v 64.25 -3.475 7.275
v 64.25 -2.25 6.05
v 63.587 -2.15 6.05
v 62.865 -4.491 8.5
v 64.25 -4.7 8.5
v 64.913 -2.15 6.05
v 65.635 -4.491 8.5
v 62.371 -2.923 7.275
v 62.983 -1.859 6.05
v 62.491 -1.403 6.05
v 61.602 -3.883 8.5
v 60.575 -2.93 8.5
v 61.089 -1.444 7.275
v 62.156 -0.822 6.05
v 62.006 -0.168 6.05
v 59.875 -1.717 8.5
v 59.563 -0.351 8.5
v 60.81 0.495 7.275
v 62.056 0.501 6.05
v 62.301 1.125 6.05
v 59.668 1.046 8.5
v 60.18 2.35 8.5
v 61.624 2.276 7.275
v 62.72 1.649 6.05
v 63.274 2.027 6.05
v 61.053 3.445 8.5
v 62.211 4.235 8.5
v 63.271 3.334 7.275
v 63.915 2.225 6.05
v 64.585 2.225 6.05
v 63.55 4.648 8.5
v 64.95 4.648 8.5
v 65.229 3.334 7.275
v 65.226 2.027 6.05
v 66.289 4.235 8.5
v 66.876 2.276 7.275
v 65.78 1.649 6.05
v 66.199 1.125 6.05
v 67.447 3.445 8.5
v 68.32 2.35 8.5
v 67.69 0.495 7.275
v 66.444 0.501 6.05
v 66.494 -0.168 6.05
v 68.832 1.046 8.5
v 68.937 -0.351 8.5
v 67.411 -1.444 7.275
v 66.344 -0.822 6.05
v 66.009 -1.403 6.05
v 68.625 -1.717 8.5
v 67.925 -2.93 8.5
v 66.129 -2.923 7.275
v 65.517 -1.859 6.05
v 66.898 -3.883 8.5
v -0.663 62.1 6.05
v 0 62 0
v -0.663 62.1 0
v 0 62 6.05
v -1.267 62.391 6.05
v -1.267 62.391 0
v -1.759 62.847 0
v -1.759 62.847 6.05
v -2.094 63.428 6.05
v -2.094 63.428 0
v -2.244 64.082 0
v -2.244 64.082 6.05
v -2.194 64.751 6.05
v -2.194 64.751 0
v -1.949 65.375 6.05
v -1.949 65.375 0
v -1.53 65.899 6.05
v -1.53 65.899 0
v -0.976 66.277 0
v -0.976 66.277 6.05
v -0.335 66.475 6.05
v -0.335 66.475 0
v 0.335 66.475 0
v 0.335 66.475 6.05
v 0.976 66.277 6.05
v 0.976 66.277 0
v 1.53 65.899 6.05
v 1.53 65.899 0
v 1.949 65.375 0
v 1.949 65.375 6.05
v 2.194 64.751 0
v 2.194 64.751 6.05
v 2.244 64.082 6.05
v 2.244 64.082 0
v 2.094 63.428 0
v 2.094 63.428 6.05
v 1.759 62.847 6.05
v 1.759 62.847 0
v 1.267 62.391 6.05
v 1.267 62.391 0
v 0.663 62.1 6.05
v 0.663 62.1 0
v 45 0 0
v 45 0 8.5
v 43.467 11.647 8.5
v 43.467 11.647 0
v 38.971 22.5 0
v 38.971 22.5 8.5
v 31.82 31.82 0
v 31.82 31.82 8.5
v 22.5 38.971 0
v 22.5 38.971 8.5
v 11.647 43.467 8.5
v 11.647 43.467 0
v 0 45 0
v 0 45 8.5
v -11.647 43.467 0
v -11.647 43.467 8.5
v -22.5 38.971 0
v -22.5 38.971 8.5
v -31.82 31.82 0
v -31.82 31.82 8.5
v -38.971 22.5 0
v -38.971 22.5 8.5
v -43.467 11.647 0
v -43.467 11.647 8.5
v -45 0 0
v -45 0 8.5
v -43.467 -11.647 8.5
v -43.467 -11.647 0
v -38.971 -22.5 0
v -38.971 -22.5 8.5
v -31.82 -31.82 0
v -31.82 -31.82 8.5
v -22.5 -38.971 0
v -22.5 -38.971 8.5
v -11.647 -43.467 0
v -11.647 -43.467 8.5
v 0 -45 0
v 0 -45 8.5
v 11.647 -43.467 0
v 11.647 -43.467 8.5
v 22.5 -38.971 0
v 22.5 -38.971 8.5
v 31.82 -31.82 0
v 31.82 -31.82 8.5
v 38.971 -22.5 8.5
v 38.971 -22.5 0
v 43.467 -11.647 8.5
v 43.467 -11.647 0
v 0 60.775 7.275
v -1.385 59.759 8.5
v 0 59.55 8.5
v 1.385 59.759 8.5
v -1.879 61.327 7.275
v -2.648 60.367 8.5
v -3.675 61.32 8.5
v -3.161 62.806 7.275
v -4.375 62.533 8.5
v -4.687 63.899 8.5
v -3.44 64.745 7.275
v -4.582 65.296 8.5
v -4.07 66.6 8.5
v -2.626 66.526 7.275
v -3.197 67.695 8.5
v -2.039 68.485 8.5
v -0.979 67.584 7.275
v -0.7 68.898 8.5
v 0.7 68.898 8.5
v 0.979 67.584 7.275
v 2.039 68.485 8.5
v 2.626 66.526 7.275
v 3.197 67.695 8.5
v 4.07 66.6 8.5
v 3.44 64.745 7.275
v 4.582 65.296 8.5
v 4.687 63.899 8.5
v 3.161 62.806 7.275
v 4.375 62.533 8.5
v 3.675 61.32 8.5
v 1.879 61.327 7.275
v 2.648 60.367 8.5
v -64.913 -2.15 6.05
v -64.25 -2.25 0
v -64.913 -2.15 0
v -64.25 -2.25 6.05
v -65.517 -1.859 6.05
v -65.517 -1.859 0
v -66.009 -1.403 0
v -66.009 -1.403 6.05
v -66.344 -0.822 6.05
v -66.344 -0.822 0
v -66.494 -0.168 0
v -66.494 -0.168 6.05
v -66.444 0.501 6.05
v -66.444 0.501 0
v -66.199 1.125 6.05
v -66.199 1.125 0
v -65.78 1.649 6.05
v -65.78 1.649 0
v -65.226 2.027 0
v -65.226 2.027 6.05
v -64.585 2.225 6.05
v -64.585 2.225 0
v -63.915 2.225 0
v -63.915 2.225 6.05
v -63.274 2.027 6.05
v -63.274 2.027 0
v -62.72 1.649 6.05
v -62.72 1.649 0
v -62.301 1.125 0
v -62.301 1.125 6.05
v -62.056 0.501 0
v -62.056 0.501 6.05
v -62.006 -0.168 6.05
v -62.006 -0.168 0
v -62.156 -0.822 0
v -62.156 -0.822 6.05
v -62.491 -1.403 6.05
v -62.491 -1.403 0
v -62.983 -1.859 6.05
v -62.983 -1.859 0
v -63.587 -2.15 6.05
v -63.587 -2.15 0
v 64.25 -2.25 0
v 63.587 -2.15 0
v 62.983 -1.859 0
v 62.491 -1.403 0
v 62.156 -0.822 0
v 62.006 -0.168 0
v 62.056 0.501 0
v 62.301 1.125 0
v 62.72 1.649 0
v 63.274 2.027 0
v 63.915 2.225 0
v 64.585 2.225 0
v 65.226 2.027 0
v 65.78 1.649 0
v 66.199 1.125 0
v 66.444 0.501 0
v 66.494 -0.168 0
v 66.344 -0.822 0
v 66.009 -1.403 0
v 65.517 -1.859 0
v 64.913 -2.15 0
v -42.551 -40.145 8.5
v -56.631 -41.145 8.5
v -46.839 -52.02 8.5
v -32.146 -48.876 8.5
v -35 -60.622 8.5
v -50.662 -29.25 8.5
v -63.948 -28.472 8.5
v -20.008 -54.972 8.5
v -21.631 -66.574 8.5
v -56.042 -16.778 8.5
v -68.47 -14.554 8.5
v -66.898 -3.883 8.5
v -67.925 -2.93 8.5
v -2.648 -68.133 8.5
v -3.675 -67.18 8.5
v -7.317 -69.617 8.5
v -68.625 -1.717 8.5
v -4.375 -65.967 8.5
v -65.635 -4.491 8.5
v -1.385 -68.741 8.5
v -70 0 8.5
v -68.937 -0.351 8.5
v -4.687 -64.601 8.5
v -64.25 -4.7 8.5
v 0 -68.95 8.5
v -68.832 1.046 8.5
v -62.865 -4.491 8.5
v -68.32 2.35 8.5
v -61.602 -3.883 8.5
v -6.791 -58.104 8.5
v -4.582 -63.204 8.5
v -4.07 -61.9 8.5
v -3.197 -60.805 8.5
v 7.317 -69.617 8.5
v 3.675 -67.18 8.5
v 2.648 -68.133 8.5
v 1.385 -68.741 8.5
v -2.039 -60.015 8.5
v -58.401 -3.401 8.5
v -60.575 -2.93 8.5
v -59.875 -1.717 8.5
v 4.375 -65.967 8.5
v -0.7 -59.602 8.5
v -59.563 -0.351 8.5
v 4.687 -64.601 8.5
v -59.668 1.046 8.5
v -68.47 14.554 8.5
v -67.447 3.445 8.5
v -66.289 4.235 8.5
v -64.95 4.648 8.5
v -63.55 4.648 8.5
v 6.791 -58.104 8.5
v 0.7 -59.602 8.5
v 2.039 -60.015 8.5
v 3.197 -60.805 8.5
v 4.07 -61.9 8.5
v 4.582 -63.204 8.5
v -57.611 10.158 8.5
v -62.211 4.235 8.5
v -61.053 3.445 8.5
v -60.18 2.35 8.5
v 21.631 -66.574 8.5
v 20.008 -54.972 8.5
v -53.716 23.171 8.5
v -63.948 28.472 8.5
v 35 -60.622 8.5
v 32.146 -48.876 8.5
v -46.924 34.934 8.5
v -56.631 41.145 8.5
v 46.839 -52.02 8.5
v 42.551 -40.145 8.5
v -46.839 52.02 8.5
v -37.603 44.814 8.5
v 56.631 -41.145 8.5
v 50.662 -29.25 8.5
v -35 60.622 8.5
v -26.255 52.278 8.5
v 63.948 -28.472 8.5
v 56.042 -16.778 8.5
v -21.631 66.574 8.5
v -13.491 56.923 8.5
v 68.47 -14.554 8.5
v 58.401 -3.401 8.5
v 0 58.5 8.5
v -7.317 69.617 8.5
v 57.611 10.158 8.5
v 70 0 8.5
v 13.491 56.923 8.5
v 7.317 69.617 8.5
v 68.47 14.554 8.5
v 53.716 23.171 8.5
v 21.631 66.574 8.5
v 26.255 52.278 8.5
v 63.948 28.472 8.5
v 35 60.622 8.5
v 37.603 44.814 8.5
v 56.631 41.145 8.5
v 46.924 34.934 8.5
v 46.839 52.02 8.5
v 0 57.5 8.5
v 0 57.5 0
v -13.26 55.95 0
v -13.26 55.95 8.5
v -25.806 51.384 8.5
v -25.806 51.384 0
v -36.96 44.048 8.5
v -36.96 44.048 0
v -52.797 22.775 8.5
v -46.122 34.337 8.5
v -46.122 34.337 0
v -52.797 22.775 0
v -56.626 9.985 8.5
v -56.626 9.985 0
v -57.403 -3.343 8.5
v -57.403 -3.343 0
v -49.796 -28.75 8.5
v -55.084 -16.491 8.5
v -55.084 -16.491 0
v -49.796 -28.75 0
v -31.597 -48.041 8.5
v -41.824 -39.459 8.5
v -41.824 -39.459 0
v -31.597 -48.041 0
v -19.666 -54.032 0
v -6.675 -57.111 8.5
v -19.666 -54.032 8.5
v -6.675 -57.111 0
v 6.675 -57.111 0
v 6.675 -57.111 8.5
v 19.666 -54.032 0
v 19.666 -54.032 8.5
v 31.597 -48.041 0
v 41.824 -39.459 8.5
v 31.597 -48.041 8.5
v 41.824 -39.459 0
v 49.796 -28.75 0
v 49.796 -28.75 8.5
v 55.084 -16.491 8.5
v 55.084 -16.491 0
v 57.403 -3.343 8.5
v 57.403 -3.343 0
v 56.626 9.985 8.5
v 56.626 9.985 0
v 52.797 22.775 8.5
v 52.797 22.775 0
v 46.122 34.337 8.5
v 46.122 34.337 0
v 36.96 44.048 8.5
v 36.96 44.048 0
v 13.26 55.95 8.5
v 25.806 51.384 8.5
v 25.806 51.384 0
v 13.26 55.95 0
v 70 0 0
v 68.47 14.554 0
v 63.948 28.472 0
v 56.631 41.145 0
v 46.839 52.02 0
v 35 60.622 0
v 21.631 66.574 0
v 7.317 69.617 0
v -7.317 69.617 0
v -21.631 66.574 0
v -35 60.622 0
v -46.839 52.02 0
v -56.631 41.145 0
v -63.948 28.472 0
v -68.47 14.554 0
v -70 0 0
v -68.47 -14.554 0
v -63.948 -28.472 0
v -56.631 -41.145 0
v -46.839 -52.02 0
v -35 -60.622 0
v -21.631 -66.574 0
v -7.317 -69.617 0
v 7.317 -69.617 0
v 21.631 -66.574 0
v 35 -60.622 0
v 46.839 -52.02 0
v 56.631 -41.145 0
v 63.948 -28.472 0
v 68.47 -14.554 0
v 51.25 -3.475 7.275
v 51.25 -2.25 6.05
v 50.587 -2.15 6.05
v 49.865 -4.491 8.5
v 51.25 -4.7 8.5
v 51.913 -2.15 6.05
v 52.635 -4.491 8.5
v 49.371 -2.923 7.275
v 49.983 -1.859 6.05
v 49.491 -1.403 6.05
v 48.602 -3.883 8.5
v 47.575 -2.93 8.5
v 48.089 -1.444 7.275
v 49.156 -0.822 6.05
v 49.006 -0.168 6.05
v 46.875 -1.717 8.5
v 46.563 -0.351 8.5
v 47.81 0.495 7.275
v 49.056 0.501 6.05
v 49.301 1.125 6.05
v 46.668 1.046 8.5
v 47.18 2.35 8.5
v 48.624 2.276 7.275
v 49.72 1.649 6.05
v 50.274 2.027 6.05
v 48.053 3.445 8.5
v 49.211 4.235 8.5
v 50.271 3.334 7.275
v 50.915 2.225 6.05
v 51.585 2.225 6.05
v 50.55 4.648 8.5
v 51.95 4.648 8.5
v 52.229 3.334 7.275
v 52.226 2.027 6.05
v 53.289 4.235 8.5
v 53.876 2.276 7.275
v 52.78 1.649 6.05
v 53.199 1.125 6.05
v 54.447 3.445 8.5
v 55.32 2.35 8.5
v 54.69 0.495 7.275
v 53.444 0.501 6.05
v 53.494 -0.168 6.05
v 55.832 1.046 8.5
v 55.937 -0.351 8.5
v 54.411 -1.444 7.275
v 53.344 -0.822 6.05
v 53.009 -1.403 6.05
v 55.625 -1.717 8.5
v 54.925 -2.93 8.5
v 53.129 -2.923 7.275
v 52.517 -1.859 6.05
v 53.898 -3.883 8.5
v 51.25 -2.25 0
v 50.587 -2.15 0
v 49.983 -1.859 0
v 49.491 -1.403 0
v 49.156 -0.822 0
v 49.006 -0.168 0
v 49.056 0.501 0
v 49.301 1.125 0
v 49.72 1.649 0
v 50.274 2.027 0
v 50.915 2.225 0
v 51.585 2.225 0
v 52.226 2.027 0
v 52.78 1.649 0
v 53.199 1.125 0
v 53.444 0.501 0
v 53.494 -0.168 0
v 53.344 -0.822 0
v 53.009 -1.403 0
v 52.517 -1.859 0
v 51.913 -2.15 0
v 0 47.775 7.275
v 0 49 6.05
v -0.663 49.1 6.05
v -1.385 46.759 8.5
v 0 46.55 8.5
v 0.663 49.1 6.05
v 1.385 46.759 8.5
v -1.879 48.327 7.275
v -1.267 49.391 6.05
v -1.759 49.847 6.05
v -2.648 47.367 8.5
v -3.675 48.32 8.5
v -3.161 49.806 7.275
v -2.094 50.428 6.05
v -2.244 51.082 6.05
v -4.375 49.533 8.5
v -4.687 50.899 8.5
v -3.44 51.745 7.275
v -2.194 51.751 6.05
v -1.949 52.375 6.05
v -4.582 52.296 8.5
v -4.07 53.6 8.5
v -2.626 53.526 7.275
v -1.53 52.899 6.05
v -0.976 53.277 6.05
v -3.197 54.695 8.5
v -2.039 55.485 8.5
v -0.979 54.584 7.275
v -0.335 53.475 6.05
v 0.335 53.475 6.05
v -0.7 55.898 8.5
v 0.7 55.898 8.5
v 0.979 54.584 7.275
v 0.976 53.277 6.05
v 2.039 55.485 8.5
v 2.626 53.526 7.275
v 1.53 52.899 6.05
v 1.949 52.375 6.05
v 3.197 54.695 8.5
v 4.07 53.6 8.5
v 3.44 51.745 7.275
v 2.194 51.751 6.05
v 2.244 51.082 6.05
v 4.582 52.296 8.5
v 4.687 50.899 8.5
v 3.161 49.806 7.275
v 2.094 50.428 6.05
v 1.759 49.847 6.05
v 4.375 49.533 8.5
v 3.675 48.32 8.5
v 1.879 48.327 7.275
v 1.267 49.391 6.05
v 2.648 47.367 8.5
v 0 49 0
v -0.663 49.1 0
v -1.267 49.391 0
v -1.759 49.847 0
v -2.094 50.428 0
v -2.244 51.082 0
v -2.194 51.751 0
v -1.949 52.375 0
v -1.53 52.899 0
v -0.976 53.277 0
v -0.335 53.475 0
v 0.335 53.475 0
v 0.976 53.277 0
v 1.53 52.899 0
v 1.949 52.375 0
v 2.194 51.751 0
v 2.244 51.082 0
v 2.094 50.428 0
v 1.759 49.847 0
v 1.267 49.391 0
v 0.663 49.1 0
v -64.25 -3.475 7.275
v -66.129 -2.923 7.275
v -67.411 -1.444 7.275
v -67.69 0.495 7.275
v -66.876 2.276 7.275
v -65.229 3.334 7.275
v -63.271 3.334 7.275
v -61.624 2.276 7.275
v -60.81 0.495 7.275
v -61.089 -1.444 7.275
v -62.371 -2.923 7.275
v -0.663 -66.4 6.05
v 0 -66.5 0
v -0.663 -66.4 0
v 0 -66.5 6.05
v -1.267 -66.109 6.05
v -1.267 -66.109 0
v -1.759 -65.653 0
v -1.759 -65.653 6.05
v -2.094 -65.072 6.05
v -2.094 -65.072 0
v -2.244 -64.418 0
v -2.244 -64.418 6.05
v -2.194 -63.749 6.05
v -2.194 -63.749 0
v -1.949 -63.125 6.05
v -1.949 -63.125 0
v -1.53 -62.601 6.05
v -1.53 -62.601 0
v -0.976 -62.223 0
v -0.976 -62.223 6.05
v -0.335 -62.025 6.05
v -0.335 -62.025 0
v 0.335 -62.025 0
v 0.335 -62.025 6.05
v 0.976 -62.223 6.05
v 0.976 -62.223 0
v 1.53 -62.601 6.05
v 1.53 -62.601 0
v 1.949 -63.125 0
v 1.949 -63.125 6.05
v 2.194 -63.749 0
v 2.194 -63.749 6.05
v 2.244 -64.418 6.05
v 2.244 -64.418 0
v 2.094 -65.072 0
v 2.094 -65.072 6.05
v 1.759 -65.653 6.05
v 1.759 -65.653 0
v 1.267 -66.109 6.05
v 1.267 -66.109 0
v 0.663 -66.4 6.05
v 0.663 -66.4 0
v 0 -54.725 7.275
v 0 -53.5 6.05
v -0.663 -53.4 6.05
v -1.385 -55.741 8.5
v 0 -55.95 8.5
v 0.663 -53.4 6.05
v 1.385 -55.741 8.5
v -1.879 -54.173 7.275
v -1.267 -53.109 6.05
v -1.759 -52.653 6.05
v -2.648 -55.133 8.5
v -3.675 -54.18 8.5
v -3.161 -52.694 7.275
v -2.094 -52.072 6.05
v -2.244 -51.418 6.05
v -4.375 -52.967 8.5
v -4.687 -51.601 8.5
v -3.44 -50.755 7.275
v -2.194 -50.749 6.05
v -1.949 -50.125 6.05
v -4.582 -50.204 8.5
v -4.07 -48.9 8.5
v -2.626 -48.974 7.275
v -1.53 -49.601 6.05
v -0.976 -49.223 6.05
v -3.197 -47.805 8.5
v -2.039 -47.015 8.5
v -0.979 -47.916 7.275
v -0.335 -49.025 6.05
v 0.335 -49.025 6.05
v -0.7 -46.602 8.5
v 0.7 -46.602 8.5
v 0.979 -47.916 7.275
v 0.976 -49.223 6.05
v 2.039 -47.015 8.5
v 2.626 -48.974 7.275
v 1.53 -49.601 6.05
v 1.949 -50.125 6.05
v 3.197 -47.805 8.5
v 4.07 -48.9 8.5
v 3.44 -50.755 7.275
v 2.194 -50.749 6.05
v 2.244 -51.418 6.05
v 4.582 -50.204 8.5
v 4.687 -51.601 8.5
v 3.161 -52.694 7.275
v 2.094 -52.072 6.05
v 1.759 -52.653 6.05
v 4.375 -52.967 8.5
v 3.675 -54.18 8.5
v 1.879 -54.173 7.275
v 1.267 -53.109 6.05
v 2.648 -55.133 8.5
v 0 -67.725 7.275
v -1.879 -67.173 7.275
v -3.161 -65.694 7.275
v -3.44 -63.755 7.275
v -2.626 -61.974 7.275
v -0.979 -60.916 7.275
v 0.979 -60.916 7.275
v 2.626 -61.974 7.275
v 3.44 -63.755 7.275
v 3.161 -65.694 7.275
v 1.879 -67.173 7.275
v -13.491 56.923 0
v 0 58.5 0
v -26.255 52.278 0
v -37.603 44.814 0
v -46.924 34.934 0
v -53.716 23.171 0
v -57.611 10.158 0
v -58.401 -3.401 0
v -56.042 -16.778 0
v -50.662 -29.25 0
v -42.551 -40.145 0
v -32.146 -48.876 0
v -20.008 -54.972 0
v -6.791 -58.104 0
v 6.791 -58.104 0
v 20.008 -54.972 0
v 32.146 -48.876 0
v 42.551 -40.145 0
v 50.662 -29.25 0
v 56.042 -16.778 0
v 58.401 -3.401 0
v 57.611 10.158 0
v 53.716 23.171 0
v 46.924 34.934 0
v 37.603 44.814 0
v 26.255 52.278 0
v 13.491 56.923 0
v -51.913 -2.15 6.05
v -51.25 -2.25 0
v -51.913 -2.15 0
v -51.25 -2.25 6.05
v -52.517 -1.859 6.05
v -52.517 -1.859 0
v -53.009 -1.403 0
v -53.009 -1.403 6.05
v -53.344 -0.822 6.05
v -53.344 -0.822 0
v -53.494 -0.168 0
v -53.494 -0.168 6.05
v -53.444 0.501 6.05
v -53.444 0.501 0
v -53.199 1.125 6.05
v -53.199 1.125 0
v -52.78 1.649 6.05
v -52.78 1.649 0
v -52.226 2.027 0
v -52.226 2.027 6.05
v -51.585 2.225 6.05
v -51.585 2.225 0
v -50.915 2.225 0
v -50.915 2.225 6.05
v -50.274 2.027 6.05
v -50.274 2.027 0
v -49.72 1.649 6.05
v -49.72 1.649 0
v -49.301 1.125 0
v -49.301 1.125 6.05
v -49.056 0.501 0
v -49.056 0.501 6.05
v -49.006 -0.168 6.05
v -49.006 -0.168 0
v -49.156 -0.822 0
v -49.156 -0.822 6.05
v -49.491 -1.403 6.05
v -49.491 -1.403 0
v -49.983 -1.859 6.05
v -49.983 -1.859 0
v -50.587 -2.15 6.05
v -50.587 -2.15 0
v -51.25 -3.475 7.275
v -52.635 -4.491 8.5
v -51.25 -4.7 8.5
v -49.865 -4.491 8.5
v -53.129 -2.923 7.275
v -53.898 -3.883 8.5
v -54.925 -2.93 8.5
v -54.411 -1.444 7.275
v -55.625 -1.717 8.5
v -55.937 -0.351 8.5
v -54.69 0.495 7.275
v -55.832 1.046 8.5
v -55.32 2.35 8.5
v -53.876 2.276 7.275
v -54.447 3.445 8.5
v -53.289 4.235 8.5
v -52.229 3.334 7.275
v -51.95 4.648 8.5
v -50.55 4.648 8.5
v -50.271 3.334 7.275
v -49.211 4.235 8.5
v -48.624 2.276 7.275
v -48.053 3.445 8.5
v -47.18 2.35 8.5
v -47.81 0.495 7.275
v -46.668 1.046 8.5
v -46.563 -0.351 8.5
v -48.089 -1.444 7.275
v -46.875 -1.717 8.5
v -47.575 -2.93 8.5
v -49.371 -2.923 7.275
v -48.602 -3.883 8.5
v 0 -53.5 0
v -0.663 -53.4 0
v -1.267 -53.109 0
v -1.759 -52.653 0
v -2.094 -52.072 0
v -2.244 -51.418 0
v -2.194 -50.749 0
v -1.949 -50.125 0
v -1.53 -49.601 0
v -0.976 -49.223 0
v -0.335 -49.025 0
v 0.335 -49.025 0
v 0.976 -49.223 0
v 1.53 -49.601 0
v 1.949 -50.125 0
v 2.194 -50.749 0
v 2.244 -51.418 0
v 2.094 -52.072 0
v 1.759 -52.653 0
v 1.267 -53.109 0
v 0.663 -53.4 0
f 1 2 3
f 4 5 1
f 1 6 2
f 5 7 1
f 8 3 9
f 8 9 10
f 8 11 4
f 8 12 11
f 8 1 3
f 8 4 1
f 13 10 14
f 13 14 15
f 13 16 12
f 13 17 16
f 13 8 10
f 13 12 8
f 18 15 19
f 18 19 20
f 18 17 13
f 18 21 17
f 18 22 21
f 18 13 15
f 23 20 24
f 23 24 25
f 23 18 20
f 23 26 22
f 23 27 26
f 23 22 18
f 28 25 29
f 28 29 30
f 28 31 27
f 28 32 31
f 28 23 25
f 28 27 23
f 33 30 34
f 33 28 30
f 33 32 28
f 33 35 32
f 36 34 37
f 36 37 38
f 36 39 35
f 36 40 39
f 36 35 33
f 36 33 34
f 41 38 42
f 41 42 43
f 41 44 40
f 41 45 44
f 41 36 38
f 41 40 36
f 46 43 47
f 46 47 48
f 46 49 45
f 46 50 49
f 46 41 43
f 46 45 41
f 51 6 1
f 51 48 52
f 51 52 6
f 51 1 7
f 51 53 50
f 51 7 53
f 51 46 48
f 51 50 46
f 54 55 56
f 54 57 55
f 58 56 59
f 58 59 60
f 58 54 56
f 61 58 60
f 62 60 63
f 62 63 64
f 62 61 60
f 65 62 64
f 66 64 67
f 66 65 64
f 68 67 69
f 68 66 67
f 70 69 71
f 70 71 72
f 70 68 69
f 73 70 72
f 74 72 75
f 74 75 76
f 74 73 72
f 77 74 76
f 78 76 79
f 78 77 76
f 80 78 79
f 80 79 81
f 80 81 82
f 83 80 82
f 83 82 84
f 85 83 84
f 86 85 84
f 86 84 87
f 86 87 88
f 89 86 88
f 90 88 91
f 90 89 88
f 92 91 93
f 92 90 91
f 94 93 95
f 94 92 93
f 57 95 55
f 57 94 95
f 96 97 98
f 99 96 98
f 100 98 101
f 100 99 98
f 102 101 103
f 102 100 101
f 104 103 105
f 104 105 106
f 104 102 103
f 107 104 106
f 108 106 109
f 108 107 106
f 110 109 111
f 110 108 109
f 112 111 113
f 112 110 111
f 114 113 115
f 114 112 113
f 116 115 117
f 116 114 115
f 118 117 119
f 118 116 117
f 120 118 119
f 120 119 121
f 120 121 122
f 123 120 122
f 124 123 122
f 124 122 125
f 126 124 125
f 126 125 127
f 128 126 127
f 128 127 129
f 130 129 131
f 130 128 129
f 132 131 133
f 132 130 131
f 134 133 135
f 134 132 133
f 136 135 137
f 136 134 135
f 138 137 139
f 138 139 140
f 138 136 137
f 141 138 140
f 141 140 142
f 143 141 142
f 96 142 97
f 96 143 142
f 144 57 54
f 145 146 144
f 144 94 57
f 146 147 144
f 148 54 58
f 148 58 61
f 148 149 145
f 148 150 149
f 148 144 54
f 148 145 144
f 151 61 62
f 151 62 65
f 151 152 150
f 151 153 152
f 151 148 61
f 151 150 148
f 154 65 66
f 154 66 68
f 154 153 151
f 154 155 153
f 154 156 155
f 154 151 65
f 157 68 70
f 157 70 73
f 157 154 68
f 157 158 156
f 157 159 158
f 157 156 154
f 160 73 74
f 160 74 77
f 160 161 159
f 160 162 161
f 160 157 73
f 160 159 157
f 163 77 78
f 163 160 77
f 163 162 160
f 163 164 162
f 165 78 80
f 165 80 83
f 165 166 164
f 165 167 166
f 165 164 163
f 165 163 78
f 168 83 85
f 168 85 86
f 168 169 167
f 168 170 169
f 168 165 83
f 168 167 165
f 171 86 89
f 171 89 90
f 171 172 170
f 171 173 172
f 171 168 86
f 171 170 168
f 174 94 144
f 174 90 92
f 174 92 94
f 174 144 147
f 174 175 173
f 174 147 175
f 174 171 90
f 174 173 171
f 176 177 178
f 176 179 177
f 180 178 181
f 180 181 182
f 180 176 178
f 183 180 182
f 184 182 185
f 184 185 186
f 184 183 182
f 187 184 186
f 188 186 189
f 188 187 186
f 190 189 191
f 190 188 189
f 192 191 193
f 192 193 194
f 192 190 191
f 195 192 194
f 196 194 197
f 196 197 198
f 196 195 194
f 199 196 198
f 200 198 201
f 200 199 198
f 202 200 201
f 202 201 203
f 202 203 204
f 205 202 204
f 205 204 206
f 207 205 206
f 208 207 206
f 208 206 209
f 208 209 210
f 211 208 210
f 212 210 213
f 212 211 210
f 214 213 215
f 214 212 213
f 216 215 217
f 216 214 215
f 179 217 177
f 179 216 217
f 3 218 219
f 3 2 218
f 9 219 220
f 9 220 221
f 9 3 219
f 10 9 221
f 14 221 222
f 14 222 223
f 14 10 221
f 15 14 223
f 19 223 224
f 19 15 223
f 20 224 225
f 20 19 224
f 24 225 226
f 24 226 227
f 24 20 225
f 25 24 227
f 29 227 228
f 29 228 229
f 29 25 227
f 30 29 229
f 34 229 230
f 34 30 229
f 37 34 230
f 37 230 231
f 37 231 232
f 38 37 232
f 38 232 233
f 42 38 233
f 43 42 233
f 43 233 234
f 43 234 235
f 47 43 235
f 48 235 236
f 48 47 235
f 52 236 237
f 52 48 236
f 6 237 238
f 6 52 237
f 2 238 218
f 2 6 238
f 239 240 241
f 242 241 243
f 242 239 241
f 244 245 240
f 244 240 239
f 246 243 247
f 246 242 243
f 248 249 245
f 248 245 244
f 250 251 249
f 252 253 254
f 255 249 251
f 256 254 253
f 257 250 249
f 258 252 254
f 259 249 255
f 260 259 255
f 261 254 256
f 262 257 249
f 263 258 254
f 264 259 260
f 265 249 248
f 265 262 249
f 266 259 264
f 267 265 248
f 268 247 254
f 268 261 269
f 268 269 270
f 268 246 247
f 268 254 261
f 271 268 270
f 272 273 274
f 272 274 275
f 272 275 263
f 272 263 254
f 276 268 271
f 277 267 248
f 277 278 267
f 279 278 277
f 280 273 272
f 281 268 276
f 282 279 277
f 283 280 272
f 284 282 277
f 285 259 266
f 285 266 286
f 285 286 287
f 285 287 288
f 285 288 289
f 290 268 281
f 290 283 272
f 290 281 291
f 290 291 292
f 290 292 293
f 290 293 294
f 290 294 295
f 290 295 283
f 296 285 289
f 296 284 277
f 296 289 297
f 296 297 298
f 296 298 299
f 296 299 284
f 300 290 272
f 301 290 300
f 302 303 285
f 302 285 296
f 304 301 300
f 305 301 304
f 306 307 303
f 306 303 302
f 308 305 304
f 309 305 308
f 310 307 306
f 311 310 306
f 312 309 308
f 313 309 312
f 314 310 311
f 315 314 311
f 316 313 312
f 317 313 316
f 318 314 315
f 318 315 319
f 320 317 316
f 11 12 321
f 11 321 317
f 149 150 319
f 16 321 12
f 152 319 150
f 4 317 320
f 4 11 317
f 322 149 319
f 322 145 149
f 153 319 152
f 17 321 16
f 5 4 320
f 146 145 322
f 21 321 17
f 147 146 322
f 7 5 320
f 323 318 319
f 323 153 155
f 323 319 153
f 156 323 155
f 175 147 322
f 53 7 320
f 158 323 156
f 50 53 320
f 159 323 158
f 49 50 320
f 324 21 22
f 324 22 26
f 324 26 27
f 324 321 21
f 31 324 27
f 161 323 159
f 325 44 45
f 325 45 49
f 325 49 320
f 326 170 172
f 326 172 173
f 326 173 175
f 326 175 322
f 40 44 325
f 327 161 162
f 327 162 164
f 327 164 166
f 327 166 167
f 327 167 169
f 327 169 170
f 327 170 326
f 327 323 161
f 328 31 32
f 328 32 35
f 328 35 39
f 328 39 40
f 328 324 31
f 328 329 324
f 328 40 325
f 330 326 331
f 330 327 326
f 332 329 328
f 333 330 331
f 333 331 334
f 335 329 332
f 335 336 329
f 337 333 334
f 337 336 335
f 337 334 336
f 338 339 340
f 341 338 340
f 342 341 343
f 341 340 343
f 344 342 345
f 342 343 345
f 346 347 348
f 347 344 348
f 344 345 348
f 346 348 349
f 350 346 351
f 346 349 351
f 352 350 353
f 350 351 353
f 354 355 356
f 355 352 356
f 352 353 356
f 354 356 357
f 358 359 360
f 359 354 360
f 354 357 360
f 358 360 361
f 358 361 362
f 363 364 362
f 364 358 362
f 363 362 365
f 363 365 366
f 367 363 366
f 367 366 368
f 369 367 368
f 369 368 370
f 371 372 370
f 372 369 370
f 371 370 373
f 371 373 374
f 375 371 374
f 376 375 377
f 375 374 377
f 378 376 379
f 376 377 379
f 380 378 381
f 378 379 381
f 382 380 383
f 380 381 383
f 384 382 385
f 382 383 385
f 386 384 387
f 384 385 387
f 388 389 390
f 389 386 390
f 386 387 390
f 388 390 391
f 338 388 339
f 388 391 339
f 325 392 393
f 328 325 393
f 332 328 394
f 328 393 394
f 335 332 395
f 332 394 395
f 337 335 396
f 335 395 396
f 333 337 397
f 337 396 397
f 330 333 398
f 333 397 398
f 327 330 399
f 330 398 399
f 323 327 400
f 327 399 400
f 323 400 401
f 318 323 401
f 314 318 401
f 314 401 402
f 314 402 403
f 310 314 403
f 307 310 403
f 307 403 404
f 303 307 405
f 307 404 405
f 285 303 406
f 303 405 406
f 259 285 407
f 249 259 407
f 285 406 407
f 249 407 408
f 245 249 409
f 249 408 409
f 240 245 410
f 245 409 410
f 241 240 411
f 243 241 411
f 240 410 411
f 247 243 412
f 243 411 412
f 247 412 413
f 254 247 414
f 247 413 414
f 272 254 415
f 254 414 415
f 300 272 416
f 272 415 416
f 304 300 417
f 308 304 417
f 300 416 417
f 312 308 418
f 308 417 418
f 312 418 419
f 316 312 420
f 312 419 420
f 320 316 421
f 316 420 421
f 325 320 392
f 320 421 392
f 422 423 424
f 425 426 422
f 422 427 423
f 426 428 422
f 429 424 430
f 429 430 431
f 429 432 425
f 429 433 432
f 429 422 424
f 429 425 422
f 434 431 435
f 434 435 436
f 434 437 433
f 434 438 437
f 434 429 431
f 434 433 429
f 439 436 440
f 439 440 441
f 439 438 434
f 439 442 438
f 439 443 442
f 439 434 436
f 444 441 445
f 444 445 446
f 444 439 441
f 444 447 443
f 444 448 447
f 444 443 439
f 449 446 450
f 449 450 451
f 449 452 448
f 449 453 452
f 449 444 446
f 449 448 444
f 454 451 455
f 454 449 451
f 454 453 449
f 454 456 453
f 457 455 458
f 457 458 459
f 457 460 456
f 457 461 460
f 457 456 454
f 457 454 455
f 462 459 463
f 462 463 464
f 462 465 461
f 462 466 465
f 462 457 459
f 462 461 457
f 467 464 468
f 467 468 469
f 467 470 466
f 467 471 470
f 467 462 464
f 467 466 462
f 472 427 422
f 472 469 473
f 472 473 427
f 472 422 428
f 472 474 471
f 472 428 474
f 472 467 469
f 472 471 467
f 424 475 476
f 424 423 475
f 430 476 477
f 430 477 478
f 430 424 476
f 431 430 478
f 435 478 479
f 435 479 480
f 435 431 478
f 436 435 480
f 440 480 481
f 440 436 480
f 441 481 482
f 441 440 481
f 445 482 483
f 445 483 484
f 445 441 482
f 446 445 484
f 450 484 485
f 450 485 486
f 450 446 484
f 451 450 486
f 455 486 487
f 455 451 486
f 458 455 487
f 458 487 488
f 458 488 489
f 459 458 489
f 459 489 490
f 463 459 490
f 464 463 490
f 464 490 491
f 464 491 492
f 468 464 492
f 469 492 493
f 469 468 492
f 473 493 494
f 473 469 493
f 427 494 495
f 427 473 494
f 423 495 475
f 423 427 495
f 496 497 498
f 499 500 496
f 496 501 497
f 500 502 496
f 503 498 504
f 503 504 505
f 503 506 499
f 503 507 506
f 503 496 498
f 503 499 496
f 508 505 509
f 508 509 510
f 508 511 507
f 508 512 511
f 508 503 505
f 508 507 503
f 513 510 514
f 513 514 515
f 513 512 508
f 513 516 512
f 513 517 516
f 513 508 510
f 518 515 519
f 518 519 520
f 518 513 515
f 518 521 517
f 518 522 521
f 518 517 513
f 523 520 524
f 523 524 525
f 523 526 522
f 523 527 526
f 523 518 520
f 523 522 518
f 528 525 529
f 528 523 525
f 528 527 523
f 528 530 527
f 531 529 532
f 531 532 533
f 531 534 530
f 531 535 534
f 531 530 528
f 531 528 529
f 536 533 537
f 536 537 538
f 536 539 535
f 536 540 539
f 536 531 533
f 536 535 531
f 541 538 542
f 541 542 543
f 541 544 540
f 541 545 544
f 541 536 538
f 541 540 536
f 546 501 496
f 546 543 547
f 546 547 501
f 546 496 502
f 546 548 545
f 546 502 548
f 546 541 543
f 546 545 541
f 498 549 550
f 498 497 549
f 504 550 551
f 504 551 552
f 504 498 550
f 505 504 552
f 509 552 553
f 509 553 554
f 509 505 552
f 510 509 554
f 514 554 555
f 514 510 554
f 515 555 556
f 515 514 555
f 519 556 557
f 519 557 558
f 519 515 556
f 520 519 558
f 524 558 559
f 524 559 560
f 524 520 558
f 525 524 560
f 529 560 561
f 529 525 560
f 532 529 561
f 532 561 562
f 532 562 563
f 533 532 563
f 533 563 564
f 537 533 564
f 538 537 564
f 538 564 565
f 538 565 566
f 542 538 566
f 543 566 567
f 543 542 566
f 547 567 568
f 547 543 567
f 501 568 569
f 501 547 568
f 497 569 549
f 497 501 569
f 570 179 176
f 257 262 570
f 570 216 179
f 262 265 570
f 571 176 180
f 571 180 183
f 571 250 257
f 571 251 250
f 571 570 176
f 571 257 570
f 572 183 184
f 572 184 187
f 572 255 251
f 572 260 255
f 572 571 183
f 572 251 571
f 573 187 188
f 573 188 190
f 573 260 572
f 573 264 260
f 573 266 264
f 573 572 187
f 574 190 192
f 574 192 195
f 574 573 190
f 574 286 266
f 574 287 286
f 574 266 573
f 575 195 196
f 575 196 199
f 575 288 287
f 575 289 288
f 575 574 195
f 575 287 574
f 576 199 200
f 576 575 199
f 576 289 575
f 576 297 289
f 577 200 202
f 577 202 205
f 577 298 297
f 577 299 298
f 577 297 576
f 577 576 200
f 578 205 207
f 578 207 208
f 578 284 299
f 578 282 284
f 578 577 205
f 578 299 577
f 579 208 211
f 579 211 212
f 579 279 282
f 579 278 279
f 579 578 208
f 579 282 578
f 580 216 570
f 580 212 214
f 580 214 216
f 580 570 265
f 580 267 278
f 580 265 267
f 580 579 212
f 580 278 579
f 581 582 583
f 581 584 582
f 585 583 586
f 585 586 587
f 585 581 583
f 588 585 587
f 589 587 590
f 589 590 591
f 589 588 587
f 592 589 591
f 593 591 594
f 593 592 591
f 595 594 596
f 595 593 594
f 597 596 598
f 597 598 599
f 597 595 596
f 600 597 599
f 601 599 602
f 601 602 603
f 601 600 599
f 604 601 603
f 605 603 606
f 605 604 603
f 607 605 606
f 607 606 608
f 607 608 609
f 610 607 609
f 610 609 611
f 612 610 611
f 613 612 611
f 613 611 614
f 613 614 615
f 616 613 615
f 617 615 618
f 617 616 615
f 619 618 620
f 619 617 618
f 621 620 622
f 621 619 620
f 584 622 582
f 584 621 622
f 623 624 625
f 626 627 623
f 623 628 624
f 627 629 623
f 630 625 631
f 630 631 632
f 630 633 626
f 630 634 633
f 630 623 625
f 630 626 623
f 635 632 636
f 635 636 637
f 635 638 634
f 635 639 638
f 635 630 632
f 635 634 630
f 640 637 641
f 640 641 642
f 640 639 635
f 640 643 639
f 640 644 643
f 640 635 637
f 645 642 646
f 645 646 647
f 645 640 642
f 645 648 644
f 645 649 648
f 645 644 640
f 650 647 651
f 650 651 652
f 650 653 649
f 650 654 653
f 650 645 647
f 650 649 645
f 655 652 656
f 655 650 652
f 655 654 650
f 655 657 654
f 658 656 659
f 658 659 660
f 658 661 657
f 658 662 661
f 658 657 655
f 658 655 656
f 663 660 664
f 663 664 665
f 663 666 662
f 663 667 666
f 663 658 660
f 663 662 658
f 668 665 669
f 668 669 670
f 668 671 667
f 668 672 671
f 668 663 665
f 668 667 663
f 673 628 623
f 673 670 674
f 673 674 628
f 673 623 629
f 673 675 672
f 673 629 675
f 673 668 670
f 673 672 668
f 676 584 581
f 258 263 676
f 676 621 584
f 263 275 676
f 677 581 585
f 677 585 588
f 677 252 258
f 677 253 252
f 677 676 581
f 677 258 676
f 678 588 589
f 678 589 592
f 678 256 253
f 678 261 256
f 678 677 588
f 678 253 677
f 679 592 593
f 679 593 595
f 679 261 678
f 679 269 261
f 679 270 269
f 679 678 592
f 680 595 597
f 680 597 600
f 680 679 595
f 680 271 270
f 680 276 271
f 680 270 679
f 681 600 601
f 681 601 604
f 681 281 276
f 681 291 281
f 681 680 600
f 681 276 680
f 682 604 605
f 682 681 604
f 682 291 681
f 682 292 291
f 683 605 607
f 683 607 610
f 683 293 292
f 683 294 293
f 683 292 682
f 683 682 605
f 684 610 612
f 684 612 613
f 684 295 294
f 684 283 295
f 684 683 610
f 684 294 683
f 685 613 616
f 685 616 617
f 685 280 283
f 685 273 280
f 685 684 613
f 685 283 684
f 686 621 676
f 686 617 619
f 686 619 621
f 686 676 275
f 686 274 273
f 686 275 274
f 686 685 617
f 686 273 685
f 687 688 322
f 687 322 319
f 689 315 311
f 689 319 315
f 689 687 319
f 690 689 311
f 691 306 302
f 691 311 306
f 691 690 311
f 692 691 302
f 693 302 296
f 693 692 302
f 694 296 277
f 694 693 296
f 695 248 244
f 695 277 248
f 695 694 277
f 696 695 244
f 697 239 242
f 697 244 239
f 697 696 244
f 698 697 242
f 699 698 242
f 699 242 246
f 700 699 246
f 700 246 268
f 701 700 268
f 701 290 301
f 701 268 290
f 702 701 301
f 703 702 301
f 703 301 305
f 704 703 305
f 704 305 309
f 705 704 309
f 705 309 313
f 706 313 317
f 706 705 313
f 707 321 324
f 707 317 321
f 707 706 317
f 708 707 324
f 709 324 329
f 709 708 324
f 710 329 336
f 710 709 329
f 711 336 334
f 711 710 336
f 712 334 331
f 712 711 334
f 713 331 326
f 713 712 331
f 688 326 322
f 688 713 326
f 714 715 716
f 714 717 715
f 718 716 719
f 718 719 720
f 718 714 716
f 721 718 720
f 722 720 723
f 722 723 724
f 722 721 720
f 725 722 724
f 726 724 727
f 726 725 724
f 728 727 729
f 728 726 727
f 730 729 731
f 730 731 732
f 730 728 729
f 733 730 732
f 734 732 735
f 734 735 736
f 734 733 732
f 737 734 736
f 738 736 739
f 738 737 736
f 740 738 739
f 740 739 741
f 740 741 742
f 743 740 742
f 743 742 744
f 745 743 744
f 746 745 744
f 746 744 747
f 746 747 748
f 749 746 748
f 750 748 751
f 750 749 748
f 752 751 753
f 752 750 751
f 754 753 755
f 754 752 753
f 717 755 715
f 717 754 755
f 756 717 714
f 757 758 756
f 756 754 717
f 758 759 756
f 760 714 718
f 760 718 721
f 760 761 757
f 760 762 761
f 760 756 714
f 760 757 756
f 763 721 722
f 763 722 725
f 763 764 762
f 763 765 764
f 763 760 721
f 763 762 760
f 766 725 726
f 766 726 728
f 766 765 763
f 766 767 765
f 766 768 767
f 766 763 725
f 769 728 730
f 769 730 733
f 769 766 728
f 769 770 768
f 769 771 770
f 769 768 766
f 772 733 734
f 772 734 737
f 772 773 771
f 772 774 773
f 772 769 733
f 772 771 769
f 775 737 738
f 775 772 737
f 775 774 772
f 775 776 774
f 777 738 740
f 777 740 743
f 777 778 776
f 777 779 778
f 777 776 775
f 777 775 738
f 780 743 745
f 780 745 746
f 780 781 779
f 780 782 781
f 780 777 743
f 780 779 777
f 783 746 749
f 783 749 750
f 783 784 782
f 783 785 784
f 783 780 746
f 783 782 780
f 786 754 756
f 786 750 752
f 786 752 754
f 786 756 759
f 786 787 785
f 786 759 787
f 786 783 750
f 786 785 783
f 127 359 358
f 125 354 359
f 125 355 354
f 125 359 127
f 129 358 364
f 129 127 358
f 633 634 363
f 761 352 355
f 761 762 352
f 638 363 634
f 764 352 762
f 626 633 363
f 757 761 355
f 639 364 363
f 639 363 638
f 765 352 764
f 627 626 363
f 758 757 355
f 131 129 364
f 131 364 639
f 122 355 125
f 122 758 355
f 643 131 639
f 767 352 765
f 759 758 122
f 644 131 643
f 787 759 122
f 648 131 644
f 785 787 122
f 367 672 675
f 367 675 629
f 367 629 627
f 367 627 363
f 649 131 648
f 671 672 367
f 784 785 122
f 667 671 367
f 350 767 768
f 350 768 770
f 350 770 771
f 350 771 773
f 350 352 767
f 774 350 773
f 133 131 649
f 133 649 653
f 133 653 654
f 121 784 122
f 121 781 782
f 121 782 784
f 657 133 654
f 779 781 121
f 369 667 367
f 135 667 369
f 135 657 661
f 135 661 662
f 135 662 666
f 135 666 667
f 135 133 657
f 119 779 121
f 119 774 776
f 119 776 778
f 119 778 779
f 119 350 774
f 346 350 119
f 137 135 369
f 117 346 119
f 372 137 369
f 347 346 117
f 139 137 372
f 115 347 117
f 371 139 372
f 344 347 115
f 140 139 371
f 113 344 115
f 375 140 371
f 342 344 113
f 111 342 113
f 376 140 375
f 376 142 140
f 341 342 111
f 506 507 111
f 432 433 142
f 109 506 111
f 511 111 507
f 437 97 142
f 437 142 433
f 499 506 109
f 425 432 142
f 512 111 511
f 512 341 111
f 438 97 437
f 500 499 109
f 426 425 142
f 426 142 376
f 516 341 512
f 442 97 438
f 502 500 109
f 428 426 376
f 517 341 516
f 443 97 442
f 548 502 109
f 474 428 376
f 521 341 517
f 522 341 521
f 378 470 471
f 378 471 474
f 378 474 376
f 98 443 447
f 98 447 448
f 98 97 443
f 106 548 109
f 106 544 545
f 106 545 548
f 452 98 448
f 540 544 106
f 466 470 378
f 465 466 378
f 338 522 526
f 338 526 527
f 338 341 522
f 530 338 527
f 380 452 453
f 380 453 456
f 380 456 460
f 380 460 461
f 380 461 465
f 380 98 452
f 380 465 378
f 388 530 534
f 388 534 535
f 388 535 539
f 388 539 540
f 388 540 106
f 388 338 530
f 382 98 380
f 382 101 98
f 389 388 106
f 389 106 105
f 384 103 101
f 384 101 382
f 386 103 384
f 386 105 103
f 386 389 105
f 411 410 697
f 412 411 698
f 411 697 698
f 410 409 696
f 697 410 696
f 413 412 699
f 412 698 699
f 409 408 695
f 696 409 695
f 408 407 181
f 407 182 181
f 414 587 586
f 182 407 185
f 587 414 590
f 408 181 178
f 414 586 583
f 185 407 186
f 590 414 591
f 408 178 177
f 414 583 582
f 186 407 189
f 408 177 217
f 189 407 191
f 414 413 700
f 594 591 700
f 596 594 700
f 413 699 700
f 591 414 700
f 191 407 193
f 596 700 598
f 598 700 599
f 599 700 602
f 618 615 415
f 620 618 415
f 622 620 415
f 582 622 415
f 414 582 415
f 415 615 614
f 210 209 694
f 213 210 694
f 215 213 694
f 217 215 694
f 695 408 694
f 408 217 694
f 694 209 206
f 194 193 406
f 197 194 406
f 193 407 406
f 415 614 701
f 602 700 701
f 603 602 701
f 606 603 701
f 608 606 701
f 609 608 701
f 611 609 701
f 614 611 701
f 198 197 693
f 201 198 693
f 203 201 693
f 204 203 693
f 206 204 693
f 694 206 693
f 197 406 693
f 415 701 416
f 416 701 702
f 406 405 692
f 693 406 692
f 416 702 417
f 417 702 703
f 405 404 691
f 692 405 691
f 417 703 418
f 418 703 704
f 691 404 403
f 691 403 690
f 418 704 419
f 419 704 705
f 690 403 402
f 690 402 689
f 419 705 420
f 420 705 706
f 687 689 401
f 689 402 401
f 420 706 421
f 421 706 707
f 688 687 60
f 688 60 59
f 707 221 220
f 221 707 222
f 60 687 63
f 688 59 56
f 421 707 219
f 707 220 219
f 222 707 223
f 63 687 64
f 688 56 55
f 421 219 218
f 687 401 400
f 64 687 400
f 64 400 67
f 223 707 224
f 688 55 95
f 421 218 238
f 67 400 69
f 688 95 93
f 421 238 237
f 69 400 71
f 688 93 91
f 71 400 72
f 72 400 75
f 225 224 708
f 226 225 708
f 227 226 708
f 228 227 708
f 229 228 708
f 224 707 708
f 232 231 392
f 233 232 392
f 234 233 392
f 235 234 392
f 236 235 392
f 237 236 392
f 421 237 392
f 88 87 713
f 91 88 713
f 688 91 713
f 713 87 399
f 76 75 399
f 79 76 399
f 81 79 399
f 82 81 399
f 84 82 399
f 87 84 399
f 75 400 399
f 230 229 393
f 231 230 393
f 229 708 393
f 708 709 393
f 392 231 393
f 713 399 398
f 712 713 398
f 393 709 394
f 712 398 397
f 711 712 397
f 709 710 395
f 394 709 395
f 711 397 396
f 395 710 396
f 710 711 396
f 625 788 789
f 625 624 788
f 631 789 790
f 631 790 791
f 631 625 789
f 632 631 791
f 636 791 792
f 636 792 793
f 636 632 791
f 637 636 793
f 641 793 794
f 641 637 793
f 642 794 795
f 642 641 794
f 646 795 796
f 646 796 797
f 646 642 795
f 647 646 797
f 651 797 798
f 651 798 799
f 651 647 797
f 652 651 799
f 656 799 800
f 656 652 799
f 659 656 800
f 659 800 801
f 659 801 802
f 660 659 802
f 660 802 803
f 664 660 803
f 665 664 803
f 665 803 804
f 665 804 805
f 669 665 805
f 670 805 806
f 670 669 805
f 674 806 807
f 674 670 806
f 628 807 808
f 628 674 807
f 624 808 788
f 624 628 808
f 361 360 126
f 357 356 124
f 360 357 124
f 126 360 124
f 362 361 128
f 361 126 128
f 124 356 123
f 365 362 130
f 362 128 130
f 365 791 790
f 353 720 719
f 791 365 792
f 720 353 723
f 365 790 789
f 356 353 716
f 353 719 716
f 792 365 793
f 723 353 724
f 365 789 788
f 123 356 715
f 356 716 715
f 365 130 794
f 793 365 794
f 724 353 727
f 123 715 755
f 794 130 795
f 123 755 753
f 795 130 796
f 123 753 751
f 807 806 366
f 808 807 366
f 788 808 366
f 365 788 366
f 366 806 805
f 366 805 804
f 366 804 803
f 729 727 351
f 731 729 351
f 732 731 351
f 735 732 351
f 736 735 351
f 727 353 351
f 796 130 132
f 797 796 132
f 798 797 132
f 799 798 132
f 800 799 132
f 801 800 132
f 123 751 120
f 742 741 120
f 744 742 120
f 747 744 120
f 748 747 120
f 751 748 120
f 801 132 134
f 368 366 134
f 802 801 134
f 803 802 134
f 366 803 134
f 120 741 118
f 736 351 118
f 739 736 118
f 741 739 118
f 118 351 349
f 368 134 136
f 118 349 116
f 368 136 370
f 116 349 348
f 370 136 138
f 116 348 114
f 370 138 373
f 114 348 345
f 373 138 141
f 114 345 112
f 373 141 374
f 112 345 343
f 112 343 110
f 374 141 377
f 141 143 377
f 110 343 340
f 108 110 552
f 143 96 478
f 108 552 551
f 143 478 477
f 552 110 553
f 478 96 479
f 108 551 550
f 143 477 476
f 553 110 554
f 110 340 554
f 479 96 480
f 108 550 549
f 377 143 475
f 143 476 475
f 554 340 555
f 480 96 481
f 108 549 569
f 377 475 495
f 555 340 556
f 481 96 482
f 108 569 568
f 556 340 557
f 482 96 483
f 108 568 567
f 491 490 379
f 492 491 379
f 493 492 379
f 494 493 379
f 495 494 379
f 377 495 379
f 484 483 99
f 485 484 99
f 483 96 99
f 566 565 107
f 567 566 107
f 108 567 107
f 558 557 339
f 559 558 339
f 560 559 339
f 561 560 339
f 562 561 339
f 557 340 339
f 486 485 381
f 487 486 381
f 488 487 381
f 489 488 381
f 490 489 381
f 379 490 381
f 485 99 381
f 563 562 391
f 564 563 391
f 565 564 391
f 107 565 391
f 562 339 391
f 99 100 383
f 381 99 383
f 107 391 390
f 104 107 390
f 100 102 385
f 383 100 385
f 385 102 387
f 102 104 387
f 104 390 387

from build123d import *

# Parameters (mm, degrees)
SKETCH2_R                                    = 70
SKETCH2_R_2                                  = 45
BOSS_EXTRUDE1_DEPTH                          = 8.5
SKETCH2_3_R                                  = 58.5
SKETCH2_3_R_2                                = 57.5
CUT_EXTRUDE_THIN2_DEPTH                      = 100.359196857
CSK_FOR_M4_COUNTERSUNK_FLAT_HEAD_SCR_2_COUNT = 2
CSK_FOR_M4_COUNTERSUNK_FLAT_HEAD_SCR_2_PITCH = 90.863221382
CSK_FOR_M4_COUNTERSUNK_FLAT_HEAD_SCR_3_COUNT = 2
CSK_FOR_M4_COUNTERSUNK_FLAT_HEAD_SCR_3_PITCH = 128.5
CSK_FOR_M4_COUNTERSUNK_FLAT_HEAD_SCR_4_COUNT = 2
CSK_FOR_M4_COUNTERSUNK_FLAT_HEAD_SCR_4_PITCH = 90.863221382
CSK_FOR_M4_COUNTERSUNK_FLAT_HEAD_SCR_5_COUNT = 2
CSK_FOR_M4_COUNTERSUNK_FLAT_HEAD_SCR_5_PITCH = 13
CSK_FOR_M4_COUNTERSUNK_FLAT_HEAD_SCR_6_COUNT = 2
CSK_FOR_M4_COUNTERSUNK_FLAT_HEAD_SCR_6_PITCH = 82.18652566
CSK_FOR_M4_COUNTERSUNK_FLAT_HEAD_SCR_7_COUNT = 2
CSK_FOR_M4_COUNTERSUNK_FLAT_HEAD_SCR_7_PITCH = 115.5
CSK_FOR_M4_COUNTERSUNK_FLAT_HEAD_SCR_8_COUNT = 2
CSK_FOR_M4_COUNTERSUNK_FLAT_HEAD_SCR_8_PITCH = 82.18652566


with BuildPart() as part:
    # Sketch2 → Boss-Extrude1 (new body)
    with BuildSketch(Plane(origin=(0, 0, 0), x_dir=(0, 1, 0), z_dir=(0, 0, 1))):
        Circle(SKETCH2_R)
        Circle(SKETCH2_R_2, mode=Mode.SUBTRACT)
    extrude(amount=BOSS_EXTRUDE1_DEPTH)

    # Sketch2<3> → Cut-Extrude-Thin2 (cut, through all)
    with BuildSketch(Plane(origin=(0, 0, 0), x_dir=(0, 1, 0), z_dir=(0, 0, 1))):
        Circle(SKETCH2_3_R)
        Circle(SKETCH2_3_R_2, mode=Mode.SUBTRACT)
    extrude(amount=CUT_EXTRUDE_THIN2_DEPTH, mode=Mode.SUBTRACT)


with BuildPart() as cut_extrude_thin2_piece_1:
    # of the separate pieces the step leaves, piece 1, a body of its own (cut_extrude_thin2_pieces)
    add(part.part.solids().sort_by_distance((0, 70, 0))[0])

    # Sketch4 → CSK for M4 Countersunk Flat Head Screw1 (revolve, cut)
    with BuildSketch(Plane(origin=(64.25, 0, 8.5), x_dir=(0, -1, 0), z_dir=(1, 0, 0))):
        Polygon((0, 0), (0, 8.5), (2.25, 8.5), (2.25, 2.45), (4.7, 0), align=None)
    csk_for_m4_countersunk_flat_head_screw1 = revolve(axis=Axis((64.25, 0, 14.85), (0, 0, -1)), mode=Mode.SUBTRACT)

    # CSK for M4 Countersunk Flat Head Scr 2: CSK for M4 Countersunk Flat Head Screw1 ×2
    with Locations(*[Vector(-0.7071067811865476, -0.7071067811865476, 0) * (i * CSK_FOR_M4_COUNTERSUNK_FLAT_HEAD_SCR_2_PITCH) for i in range(1, CSK_FOR_M4_COUNTERSUNK_FLAT_HEAD_SCR_2_COUNT)]):
        add(csk_for_m4_countersunk_flat_head_screw1, mode=Mode.SUBTRACT)

    # CSK for M4 Countersunk Flat Head Scr 3: CSK for M4 Countersunk Flat Head Screw1 ×2
    with Locations(*[(-i * CSK_FOR_M4_COUNTERSUNK_FLAT_HEAD_SCR_3_PITCH, 0, 0) for i in range(1, CSK_FOR_M4_COUNTERSUNK_FLAT_HEAD_SCR_3_COUNT)]):
        add(csk_for_m4_countersunk_flat_head_screw1, mode=Mode.SUBTRACT)

    # CSK for M4 Countersunk Flat Head Scr 4: CSK for M4 Countersunk Flat Head Screw1 ×2
    with Locations(*[Vector(-0.7071067811865476, 0.7071067811865476, 0) * (i * CSK_FOR_M4_COUNTERSUNK_FLAT_HEAD_SCR_4_PITCH) for i in range(1, CSK_FOR_M4_COUNTERSUNK_FLAT_HEAD_SCR_4_COUNT)]):
        add(csk_for_m4_countersunk_flat_head_screw1, mode=Mode.SUBTRACT)


with BuildPart() as cut_extrude_thin2_piece_2:
    # of the separate pieces the step leaves, piece 2, a body of its own (cut_extrude_thin2_pieces)
    add(part.part.solids().sort_by_distance((0, 57.5, 0))[0])

    # CSK for M4 Countersunk Flat Head Scr 5: CSK for M4 Countersunk Flat Head Screw1 ×2
    with Locations(*[(-i * CSK_FOR_M4_COUNTERSUNK_FLAT_HEAD_SCR_5_PITCH, 0, 0) for i in range(1, CSK_FOR_M4_COUNTERSUNK_FLAT_HEAD_SCR_5_COUNT)]):
        add(csk_for_m4_countersunk_flat_head_screw1, mode=Mode.SUBTRACT)

    # CSK for M4 Countersunk Flat Head Scr 6: CSK for M4 Countersunk Flat Head Screw1 ×2
    with Locations(*[Vector(-0.7817583172464547, -0.6235815371032014, 0) * (i * CSK_FOR_M4_COUNTERSUNK_FLAT_HEAD_SCR_6_PITCH) for i in range(1, CSK_FOR_M4_COUNTERSUNK_FLAT_HEAD_SCR_6_COUNT)]):
        add(csk_for_m4_countersunk_flat_head_screw1, mode=Mode.SUBTRACT)

    # CSK for M4 Countersunk Flat Head Scr 7: CSK for M4 Countersunk Flat Head Screw1 ×2
    with Locations(*[(-i * CSK_FOR_M4_COUNTERSUNK_FLAT_HEAD_SCR_7_PITCH, 0, 0) for i in range(1, CSK_FOR_M4_COUNTERSUNK_FLAT_HEAD_SCR_7_COUNT)]):
        add(csk_for_m4_countersunk_flat_head_screw1, mode=Mode.SUBTRACT)

    # CSK for M4 Countersunk Flat Head Scr 8: CSK for M4 Countersunk Flat Head Screw1 ×2
    with Locations(*[Vector(-0.7817583172464514, 0.6235815371032057, 0) * (i * CSK_FOR_M4_COUNTERSUNK_FLAT_HEAD_SCR_8_PITCH) for i in range(1, CSK_FOR_M4_COUNTERSUNK_FLAT_HEAD_SCR_8_COUNT)]):
        add(csk_for_m4_countersunk_flat_head_screw1, mode=Mode.SUBTRACT)


solid = Compound([cut_extrude_thin2_piece_1.part, cut_extrude_thin2_piece_2.part])
